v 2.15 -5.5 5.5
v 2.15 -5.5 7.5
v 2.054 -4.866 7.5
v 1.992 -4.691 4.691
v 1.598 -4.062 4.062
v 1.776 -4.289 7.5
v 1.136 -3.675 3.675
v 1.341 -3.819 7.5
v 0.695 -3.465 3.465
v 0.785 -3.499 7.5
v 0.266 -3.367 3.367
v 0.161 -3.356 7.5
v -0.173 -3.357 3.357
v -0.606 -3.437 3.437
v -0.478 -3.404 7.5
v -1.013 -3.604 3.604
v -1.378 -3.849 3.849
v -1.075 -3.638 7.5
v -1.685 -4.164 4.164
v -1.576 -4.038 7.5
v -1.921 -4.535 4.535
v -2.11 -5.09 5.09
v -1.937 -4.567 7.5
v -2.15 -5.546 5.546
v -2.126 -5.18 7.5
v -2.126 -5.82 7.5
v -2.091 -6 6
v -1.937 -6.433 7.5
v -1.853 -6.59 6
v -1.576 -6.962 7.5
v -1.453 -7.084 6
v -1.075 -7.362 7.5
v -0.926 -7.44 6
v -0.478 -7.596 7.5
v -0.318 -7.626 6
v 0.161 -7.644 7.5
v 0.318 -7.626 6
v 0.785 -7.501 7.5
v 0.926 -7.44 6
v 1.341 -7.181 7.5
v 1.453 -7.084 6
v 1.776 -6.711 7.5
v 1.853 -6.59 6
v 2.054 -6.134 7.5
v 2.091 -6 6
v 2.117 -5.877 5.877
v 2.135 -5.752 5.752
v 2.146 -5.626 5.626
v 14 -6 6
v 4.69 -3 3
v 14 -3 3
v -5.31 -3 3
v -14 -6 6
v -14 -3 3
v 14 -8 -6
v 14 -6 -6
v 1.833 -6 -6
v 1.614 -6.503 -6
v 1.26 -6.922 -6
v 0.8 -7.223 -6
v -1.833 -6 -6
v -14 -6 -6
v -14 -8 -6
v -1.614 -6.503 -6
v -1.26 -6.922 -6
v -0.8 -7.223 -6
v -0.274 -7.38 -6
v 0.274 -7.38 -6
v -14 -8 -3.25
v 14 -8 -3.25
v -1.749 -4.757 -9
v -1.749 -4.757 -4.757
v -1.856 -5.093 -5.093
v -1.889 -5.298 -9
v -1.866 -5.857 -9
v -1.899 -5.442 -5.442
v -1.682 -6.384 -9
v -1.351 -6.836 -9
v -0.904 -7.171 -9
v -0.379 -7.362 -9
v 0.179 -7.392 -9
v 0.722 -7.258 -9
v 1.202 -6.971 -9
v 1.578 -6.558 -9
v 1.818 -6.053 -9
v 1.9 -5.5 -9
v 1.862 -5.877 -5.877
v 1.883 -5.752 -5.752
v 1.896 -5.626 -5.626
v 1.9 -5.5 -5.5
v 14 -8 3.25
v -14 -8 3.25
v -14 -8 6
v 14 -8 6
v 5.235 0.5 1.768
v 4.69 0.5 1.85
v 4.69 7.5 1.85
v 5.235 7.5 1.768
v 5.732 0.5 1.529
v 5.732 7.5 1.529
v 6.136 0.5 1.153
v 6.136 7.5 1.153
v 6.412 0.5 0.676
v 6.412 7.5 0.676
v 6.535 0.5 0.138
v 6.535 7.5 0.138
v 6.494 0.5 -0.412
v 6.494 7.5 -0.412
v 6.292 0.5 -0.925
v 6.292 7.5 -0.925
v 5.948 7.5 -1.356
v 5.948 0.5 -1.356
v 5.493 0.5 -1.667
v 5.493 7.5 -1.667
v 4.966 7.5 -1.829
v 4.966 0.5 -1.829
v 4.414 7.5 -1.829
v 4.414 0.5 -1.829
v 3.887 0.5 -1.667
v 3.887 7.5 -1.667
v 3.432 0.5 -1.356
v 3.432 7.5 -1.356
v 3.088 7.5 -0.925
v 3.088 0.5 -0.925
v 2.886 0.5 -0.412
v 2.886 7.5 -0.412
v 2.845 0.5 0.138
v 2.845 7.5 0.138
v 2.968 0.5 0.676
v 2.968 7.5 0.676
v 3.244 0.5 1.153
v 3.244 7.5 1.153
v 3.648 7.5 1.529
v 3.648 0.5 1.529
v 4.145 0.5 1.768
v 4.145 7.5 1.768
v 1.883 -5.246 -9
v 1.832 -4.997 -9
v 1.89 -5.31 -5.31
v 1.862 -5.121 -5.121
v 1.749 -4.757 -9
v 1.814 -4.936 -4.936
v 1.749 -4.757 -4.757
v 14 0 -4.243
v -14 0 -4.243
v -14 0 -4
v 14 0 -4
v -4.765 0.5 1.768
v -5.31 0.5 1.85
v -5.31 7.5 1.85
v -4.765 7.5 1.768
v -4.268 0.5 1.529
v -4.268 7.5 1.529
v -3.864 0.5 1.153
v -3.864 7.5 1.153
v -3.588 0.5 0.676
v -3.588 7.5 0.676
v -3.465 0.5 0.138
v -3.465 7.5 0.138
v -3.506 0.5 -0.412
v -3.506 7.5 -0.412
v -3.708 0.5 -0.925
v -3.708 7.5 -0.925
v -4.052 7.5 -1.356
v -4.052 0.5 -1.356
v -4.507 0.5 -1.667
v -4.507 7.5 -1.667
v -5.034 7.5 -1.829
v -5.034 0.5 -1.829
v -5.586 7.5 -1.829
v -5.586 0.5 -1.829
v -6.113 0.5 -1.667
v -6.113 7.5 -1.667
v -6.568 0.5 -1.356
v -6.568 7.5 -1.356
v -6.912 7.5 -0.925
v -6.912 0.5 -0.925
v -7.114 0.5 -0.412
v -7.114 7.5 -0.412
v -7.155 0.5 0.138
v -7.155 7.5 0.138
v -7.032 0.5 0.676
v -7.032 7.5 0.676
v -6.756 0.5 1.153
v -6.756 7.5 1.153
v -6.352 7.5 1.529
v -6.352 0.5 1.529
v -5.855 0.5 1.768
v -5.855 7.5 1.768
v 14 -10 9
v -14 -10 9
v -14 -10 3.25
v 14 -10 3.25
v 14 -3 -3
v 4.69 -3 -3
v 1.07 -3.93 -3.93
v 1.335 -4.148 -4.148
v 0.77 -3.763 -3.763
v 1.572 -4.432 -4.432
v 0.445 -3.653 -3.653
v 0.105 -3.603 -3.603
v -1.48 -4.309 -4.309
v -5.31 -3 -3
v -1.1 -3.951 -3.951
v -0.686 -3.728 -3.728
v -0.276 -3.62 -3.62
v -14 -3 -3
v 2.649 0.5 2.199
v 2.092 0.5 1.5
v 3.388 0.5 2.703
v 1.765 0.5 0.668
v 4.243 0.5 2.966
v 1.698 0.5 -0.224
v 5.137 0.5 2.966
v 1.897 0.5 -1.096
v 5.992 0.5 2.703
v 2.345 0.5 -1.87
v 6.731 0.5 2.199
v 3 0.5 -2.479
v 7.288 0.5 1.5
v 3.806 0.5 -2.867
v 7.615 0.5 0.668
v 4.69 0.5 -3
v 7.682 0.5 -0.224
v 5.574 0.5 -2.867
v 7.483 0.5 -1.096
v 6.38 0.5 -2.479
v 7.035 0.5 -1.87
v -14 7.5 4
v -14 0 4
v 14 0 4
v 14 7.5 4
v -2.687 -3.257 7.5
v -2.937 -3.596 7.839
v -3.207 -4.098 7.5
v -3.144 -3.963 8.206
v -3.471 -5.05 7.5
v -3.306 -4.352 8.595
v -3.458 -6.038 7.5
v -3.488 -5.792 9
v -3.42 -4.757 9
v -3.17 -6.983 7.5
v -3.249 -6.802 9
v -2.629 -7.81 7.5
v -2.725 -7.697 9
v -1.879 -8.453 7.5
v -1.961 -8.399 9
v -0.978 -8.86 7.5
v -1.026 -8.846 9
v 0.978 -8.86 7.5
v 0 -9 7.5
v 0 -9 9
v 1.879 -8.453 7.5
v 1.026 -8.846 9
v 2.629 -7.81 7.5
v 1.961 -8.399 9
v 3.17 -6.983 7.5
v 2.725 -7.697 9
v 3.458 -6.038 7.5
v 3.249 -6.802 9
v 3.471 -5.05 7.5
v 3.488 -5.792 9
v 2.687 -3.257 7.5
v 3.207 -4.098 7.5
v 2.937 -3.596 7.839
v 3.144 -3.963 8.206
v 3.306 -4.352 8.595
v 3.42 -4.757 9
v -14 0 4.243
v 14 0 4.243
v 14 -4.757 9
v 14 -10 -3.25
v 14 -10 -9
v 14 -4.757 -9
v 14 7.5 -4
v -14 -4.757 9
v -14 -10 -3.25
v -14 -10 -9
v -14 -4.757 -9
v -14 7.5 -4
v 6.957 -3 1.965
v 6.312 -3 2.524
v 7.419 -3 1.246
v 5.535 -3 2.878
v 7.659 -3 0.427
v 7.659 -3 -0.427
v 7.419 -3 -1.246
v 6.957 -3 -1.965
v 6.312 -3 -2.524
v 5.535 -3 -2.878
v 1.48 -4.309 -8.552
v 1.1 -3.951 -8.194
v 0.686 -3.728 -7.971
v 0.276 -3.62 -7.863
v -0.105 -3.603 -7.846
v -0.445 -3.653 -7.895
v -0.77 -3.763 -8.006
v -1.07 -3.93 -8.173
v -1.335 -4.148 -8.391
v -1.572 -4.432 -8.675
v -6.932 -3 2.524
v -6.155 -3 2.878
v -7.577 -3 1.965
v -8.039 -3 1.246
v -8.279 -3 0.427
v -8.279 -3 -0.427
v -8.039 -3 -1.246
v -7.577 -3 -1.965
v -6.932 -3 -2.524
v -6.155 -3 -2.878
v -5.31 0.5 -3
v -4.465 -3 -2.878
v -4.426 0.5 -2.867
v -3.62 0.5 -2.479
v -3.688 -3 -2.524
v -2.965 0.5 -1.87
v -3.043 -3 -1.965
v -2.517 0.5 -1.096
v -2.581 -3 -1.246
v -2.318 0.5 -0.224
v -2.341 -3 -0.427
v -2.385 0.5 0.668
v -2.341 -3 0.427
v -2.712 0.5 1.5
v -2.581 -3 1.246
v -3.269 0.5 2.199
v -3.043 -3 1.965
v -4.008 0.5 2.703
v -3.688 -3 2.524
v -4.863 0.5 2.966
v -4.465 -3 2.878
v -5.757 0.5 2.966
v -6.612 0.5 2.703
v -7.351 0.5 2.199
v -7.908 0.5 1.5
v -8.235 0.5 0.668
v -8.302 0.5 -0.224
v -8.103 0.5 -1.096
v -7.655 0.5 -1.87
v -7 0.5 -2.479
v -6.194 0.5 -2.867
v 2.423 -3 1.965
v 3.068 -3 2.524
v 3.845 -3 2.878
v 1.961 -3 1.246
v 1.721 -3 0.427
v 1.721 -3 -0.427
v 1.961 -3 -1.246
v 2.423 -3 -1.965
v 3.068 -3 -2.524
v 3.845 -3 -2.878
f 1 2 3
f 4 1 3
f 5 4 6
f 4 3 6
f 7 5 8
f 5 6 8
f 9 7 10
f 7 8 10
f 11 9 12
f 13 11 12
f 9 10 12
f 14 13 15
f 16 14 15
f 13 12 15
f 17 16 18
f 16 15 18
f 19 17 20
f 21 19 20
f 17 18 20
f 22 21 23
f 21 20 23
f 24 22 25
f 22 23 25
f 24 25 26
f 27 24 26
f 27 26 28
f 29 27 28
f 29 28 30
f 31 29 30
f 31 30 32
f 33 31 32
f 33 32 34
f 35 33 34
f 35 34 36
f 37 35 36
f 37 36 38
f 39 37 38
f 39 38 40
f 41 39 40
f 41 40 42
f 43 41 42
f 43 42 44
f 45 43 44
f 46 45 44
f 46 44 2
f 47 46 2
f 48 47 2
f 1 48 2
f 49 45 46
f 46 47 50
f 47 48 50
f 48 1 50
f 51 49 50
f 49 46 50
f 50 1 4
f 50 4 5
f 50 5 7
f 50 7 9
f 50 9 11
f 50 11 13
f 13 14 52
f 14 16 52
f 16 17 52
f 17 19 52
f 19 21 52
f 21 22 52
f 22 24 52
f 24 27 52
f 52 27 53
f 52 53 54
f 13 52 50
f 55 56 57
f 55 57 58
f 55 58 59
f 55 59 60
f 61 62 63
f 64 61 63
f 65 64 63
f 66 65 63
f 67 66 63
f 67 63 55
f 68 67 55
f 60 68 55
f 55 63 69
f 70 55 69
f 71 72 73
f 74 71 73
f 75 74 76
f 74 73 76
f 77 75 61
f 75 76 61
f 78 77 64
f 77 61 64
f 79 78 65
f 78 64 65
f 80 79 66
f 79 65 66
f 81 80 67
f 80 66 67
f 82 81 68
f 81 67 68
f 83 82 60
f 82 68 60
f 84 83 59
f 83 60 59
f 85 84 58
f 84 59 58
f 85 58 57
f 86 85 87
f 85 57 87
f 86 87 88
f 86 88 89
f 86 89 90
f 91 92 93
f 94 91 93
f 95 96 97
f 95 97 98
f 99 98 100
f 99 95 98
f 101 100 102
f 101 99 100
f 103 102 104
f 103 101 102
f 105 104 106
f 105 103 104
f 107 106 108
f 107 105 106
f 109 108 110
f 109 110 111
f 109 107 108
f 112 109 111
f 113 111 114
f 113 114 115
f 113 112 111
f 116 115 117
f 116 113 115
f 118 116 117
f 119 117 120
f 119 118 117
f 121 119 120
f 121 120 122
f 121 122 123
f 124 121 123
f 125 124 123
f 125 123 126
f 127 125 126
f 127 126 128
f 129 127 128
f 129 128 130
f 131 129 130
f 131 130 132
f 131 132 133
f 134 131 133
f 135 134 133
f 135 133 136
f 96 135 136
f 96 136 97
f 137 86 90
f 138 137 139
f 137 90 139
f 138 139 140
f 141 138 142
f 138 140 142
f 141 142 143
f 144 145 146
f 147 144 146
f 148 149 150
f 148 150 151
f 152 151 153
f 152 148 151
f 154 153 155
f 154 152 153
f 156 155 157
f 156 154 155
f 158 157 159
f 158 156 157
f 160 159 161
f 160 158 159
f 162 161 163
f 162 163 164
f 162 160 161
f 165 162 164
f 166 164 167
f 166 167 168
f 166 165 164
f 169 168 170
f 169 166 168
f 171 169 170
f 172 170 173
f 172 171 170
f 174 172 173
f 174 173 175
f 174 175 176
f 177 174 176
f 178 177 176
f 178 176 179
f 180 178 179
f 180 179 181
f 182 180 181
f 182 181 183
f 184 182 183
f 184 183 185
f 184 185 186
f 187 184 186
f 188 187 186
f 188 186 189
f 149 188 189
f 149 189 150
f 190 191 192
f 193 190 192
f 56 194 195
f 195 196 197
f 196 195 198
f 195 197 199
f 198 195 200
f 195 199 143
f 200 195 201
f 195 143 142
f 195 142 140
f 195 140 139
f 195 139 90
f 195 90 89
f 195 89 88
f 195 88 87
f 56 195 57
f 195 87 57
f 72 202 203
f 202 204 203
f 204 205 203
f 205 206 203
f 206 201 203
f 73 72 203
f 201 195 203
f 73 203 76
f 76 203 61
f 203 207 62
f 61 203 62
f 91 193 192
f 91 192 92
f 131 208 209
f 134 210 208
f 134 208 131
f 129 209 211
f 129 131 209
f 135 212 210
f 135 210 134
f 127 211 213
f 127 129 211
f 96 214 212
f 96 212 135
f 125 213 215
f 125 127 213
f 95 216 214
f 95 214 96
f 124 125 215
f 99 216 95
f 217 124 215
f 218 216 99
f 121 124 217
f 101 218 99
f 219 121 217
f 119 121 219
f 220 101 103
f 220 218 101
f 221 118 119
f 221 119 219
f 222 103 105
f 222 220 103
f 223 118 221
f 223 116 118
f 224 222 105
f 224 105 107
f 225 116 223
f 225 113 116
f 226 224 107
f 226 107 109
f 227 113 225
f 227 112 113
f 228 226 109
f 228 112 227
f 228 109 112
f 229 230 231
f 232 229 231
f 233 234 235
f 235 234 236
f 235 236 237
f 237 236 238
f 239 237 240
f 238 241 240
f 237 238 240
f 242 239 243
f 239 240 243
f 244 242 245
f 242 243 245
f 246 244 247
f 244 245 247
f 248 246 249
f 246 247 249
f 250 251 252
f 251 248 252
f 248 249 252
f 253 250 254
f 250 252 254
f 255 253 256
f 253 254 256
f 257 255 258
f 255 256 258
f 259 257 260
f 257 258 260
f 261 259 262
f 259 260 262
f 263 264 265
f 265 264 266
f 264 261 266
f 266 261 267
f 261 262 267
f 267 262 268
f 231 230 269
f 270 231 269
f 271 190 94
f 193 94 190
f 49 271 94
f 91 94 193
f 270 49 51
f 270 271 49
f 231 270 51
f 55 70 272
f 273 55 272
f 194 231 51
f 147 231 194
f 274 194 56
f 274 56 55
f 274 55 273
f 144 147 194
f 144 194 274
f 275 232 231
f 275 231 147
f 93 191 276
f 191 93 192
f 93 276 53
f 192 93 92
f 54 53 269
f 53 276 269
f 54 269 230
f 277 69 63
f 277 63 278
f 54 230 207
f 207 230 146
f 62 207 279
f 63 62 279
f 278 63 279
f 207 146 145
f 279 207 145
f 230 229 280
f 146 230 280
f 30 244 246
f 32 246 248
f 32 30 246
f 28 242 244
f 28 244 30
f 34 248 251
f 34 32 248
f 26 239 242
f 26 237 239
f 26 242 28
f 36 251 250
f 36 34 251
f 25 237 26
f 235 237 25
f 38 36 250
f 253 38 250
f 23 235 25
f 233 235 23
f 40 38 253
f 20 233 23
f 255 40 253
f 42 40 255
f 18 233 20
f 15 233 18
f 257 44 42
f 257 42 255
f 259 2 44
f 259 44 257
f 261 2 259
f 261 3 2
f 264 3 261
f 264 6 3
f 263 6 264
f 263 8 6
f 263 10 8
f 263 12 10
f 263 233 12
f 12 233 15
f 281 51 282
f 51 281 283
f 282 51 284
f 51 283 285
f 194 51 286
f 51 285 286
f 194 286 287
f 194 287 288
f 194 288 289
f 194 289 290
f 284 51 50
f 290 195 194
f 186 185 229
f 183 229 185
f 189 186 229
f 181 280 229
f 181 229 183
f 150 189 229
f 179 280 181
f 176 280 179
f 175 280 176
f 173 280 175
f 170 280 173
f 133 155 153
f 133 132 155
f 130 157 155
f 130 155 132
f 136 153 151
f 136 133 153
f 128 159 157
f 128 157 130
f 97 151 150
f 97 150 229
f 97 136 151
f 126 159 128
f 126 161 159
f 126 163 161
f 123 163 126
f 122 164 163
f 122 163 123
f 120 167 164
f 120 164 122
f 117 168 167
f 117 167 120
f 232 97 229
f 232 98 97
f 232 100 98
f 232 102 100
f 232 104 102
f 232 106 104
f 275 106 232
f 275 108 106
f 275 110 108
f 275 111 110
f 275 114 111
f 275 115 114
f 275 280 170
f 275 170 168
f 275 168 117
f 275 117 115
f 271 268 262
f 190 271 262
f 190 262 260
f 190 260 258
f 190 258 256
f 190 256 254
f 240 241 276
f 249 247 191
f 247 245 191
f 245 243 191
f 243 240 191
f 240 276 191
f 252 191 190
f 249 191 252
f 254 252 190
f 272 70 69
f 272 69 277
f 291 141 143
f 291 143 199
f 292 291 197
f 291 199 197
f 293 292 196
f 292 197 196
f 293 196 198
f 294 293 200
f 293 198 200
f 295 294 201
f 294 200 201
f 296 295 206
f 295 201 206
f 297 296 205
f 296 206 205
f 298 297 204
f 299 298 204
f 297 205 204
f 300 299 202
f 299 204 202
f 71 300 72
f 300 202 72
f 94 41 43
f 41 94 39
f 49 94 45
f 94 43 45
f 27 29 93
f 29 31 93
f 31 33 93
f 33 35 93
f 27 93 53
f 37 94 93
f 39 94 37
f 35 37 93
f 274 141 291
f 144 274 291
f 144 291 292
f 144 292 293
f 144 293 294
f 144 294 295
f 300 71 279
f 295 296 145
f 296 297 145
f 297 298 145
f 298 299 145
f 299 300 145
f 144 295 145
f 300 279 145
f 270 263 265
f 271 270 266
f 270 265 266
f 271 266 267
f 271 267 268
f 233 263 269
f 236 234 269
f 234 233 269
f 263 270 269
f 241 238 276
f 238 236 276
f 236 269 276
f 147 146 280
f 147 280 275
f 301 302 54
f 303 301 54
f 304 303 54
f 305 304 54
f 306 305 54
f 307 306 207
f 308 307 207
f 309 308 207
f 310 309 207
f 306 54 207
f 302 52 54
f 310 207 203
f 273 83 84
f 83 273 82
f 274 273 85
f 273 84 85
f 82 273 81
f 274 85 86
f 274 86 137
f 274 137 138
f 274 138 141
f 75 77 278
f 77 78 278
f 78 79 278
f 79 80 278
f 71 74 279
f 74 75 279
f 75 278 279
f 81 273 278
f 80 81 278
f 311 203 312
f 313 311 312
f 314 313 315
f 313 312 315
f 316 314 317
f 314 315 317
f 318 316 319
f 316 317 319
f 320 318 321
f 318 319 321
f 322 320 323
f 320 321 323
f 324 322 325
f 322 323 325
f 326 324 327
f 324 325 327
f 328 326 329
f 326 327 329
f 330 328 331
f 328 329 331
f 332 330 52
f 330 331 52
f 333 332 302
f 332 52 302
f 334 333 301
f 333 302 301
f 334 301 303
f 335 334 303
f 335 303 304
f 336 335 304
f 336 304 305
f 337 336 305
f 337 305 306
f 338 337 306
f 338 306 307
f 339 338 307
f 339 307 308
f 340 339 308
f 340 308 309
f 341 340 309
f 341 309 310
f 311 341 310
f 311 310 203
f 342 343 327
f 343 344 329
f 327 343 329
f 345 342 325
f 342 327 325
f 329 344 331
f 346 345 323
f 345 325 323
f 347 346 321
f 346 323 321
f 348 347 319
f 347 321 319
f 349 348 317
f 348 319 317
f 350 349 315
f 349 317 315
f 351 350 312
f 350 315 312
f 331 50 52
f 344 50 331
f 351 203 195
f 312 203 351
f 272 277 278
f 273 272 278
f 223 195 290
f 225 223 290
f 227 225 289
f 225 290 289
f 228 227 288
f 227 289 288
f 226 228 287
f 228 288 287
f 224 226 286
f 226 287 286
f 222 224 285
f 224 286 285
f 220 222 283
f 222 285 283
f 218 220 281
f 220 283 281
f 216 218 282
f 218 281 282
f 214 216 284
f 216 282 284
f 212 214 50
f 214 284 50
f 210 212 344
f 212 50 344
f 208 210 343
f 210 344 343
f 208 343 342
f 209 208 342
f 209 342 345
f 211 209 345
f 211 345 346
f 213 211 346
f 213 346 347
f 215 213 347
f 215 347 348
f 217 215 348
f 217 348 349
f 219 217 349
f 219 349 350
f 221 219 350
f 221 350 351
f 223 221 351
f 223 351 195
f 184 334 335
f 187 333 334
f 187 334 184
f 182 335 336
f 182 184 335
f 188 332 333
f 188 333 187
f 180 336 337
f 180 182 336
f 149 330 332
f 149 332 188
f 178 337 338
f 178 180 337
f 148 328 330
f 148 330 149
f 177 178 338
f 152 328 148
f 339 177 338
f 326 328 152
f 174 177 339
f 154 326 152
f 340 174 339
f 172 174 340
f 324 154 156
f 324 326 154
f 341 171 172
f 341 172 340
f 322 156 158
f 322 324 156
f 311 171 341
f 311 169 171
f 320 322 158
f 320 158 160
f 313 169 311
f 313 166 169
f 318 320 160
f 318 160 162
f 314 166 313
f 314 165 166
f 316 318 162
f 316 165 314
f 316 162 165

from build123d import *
from build123d.topology import SkipClean

# Parameters (mm, degrees)
CROQUIS1_W              = 28
CROQUIS1_H              = 8
CROQUIS1_R              = 1.85
SALIENTE_EXTRUIR1_DEPTH = 7.5
SALIENTE_EXTRUIR2_DEPTH = 28
CROQUIS4_R              = 1.85
CORTAR_EXTRUIR1_DEPTH   = 20.416487839
CROQUIS5_R              = 3
CORTAR_EXTRUIR2_DEPTH   = 3.5
CORTAR_EXTRUIR3_DEPTH   = 25.899799196
CROQUIS7_R              = 3.5
CORTAR_EXTRUIR4_DEPTH   = 1.5
CROQUIS8_R              = 2.15
CORTAR_EXTRUIR5_DEPTH   = 5


with BuildPart() as part:
    # Croquis1 → Saliente-Extruir1 (new body)
    with BuildSketch(Plane(origin=(0, 0, 0), x_dir=(1, 0, 0), z_dir=(0, 1, 0))):
        Rectangle(CROQUIS1_W, CROQUIS1_H)
        with Locations(Location((-5.31, 0, 0), (0, 0, 270))):
            Circle(CROQUIS1_R, mode=Mode.SUBTRACT)
        with Locations(Location((4.69, 0, 0), (0, 0, 270))):
            Circle(CROQUIS1_R, mode=Mode.SUBTRACT)
    extrude(amount=SALIENTE_EXTRUIR1_DEPTH)

    # Croquis3 → Saliente-Extruir2 (add, through all)
    with BuildSketch(Plane.ZY.offset(14)):
        Polygon((-4.242640687, 0), (4.242640687, 0), (9, -4.757359313), (9, -10), (3.25, -10), (3.25, -8), (6, -8), (6, -6), (3, -3), (-3, -3), (-6, -6), (-6, -8), (-3.25, -8), (-3.25, -10), (-9, -10), (-9, -4.757359313), align=None)
    extrude(amount=-SALIENTE_EXTRUIR2_DEPTH)

    # Croquis4 → Cortar-Extruir1 (cut, through all)
    with SkipClean():  # the faces are left unmerged after this step: merging them gives an invalid solid
        with BuildSketch(Plane(origin=(0, 0, 0), x_dir=(1, 0, 0), z_dir=(0, 1, 0))):
            with Locations(Location((4.69, 0, 0), (0, 0, 90))):
                Circle(CROQUIS4_R)
            with Locations(Location((-5.31, 0, 0), (0, 0, 90))):
                Circle(CROQUIS4_R)
        extrude(amount=-CORTAR_EXTRUIR1_DEPTH, mode=Mode.SUBTRACT)

    # Croquis5 → Cortar-Extruir2 (cut)
    with BuildSketch(Plane.XZ.offset(3)):
        with Locations(Location((-5.31, 0, 0), (0, 0, 270))):
            Circle(CROQUIS5_R)
        with Locations(Location((4.69, 0, 0), (0, 0, 270))):
            Circle(CROQUIS5_R)
    extrude(amount=-CORTAR_EXTRUIR2_DEPTH, mode=Mode.SUBTRACT)

    # Croquis6 → Cortar-Extruir3 (cut, through all)
    with BuildSketch(Plane.XY.offset(9)):
        with BuildLine():
            ThreePointArc((-1.748852427, -4.757359313), (-0.378932969, -7.361829693), (1.9, -5.5))
            ThreePointArc((1.9, -5.5), (1.861829693, -5.121067031), (1.748852427, -4.757359313))
            Line((1.748852427, -4.757359313), (-1.748852427, -4.757359313))
        make_face()
        with BuildLine():
            Line((-1.748852427, -4.757359313), (1.748852427, -4.757359313))
            ThreePointArc((1.748852427, -4.757359313), (0, -3.6), (-1.748852427, -4.757359313))
        make_face()
    extrude(amount=-CORTAR_EXTRUIR3_DEPTH, mode=Mode.SUBTRACT)

    # Croquis7 → Cortar-Extruir4 (cut)
    with BuildSketch(Plane.XY.offset(9)):
        with Locations((0, -5.5)):
            Circle(CROQUIS7_R)
    extrude(amount=-CORTAR_EXTRUIR4_DEPTH, mode=Mode.SUBTRACT)

    # Croquis8 → Cortar-Extruir5 (cut)
    with BuildSketch(Plane.XY.offset(7.5)):
        with Locations((0, -5.5)):
            Circle(CROQUIS8_R)
    extrude(amount=-CORTAR_EXTRUIR5_DEPTH, mode=Mode.SUBTRACT)


solid = part.part
